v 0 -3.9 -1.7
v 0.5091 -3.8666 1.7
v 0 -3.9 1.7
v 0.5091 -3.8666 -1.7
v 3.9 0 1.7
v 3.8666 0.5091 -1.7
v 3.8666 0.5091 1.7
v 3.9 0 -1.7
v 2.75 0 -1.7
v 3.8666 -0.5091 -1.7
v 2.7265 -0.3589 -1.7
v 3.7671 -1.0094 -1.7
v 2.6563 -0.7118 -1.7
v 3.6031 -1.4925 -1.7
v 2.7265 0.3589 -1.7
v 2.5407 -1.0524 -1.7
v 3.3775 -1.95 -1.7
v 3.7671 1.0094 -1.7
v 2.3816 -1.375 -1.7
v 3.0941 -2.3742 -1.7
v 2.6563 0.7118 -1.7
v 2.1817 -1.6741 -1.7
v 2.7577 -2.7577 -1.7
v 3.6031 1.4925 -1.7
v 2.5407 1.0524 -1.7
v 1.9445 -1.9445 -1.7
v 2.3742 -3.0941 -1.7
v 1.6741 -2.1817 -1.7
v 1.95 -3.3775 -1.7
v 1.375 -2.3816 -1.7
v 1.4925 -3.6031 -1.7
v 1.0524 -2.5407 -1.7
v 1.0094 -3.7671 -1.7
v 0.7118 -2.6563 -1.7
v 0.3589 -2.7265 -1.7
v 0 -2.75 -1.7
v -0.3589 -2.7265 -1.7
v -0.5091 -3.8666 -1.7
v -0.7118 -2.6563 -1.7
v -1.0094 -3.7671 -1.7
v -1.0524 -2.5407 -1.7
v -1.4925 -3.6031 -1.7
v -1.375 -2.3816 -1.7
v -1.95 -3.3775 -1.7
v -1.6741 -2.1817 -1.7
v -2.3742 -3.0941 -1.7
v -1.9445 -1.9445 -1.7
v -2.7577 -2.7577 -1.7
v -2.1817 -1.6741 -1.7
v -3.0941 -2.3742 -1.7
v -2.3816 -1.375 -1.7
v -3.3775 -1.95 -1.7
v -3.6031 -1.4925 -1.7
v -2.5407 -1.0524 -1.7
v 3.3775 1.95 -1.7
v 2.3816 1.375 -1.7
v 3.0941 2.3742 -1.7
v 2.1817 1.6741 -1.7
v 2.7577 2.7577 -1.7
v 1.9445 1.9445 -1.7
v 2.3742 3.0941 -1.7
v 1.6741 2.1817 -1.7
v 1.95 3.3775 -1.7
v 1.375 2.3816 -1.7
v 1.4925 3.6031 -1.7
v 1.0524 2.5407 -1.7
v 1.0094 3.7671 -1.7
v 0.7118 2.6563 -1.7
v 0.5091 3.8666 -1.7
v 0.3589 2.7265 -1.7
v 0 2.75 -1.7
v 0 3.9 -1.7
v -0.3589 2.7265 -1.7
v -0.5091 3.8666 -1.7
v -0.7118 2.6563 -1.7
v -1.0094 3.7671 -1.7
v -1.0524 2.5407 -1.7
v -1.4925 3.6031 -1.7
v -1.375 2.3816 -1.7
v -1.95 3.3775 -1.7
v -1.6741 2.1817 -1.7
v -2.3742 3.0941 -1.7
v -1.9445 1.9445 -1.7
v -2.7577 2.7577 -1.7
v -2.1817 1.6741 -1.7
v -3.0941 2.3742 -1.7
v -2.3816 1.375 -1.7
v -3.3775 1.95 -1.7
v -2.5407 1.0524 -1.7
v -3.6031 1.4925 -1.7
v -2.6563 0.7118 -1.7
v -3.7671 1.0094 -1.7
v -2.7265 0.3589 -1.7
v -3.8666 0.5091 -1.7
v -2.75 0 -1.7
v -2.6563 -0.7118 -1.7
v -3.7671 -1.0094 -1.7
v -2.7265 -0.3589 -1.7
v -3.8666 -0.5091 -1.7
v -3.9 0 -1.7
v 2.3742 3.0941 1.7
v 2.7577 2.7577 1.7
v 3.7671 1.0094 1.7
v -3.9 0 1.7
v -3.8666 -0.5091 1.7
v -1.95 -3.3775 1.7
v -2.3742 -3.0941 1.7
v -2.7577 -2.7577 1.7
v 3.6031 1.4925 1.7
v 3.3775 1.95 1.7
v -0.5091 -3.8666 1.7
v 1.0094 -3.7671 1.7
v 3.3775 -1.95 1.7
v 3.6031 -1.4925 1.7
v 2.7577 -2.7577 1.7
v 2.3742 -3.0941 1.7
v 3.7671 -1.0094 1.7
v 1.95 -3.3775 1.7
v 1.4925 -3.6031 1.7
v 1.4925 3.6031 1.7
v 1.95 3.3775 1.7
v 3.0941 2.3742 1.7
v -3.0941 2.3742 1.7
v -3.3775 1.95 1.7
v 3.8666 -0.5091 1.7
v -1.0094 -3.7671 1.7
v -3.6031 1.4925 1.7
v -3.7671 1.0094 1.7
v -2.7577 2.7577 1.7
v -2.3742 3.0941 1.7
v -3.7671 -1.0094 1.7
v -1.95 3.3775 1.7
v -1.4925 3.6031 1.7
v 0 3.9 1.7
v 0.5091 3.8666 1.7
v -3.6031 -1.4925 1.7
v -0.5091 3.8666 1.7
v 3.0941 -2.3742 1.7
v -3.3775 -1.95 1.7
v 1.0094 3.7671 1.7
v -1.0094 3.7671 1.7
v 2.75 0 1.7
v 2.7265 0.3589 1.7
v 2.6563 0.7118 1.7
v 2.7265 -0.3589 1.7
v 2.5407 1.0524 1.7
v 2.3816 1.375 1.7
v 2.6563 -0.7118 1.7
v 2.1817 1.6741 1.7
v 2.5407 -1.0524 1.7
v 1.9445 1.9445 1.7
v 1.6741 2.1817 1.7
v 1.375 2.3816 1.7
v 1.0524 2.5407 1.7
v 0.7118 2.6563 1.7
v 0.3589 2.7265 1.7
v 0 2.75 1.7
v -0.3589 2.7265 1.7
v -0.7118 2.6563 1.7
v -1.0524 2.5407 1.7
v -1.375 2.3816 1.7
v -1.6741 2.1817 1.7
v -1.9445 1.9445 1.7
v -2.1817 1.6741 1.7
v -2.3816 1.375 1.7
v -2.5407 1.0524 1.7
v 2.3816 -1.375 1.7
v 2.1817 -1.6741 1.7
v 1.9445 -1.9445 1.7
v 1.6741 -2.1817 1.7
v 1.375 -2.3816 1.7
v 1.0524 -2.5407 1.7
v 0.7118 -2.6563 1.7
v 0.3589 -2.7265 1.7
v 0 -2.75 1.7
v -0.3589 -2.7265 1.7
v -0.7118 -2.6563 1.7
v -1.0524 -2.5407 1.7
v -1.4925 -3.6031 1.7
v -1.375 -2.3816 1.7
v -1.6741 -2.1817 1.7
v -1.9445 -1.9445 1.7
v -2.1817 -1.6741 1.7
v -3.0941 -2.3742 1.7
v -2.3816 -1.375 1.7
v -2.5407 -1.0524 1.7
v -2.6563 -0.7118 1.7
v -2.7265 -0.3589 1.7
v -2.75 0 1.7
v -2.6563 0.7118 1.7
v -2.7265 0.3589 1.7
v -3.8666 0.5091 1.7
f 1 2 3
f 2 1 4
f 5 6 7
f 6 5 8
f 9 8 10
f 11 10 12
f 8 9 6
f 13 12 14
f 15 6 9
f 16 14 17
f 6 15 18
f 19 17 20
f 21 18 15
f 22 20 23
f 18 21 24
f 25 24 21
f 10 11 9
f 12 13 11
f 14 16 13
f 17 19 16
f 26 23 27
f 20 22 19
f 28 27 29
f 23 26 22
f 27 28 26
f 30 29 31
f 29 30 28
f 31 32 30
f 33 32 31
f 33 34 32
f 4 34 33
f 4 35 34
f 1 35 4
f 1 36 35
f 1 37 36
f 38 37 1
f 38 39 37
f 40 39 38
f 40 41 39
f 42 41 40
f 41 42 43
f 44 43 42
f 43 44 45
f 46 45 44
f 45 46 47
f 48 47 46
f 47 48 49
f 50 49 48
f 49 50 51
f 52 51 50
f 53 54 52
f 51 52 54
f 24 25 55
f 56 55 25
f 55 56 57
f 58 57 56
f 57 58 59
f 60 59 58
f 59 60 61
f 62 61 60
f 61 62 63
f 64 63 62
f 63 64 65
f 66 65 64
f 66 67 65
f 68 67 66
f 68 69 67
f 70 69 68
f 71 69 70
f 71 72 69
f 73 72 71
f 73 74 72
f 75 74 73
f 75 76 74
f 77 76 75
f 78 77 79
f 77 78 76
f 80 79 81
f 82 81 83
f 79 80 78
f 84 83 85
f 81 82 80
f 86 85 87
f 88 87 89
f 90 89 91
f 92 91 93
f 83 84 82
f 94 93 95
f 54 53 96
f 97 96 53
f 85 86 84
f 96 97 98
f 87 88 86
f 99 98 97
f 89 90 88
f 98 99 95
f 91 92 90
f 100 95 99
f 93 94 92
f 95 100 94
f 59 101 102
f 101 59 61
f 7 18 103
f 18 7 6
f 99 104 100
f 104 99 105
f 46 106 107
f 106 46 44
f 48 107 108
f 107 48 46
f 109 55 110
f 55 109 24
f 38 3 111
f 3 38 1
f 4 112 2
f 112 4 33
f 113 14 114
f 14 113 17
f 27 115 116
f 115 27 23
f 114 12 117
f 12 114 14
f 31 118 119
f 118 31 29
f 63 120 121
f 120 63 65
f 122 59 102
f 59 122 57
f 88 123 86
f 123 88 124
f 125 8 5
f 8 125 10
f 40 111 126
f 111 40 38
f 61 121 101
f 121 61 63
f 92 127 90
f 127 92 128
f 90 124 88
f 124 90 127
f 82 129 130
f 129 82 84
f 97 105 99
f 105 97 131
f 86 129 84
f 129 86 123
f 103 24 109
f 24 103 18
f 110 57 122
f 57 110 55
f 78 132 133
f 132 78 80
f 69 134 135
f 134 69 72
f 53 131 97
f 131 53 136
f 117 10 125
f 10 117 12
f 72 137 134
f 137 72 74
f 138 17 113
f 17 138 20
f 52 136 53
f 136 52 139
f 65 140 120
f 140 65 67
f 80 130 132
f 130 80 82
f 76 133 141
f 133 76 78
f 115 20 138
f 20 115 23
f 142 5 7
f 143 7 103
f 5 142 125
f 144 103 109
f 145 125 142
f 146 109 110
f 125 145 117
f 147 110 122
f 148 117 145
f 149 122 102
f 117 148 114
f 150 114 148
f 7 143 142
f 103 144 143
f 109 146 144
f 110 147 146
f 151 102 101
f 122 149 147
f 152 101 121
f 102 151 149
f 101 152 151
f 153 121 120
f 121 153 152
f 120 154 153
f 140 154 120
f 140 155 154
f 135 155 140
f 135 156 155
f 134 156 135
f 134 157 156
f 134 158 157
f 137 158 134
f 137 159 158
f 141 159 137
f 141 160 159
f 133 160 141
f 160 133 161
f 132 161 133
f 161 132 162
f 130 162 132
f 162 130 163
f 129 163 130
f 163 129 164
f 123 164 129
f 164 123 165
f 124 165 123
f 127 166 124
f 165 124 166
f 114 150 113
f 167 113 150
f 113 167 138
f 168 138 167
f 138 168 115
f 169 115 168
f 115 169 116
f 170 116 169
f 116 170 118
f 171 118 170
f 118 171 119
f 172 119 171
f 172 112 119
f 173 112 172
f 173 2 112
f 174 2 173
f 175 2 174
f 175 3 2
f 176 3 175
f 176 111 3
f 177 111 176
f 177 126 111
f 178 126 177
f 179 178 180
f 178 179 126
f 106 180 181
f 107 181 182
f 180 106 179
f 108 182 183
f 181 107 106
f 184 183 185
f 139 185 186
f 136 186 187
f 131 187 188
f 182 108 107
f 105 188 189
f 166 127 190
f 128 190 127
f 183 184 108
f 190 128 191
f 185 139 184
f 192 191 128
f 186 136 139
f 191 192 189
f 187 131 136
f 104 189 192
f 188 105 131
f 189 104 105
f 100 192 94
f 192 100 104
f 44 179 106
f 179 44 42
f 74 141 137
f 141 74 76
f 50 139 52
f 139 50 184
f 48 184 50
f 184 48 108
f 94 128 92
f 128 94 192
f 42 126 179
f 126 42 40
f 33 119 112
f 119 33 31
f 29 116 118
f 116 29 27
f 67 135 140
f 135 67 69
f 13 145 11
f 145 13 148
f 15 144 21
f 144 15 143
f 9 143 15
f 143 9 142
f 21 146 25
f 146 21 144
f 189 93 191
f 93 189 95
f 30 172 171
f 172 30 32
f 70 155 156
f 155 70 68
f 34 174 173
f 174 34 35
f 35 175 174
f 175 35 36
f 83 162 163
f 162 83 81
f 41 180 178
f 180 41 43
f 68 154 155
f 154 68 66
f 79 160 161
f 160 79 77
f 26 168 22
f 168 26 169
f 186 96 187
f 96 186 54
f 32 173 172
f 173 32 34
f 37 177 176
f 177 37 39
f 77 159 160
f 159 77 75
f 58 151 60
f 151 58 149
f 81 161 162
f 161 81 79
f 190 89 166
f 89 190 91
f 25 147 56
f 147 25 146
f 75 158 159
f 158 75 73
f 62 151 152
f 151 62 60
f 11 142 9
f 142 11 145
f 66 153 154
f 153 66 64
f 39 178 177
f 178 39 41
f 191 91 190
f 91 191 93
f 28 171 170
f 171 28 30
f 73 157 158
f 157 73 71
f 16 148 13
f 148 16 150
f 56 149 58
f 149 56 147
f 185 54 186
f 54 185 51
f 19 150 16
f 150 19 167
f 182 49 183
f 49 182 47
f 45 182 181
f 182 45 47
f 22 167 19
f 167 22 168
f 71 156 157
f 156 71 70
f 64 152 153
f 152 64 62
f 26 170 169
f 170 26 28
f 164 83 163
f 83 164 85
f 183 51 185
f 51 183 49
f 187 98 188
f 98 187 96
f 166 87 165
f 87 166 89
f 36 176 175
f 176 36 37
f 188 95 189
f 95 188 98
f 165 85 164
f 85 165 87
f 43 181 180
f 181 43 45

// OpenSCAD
difference()
{
	cylinder(d=7.8,h=3.4,center=true,$fn=24*2);
	cylinder(d=5.5,h=3.4+0.2,center=true,$fn=24*2);
}
